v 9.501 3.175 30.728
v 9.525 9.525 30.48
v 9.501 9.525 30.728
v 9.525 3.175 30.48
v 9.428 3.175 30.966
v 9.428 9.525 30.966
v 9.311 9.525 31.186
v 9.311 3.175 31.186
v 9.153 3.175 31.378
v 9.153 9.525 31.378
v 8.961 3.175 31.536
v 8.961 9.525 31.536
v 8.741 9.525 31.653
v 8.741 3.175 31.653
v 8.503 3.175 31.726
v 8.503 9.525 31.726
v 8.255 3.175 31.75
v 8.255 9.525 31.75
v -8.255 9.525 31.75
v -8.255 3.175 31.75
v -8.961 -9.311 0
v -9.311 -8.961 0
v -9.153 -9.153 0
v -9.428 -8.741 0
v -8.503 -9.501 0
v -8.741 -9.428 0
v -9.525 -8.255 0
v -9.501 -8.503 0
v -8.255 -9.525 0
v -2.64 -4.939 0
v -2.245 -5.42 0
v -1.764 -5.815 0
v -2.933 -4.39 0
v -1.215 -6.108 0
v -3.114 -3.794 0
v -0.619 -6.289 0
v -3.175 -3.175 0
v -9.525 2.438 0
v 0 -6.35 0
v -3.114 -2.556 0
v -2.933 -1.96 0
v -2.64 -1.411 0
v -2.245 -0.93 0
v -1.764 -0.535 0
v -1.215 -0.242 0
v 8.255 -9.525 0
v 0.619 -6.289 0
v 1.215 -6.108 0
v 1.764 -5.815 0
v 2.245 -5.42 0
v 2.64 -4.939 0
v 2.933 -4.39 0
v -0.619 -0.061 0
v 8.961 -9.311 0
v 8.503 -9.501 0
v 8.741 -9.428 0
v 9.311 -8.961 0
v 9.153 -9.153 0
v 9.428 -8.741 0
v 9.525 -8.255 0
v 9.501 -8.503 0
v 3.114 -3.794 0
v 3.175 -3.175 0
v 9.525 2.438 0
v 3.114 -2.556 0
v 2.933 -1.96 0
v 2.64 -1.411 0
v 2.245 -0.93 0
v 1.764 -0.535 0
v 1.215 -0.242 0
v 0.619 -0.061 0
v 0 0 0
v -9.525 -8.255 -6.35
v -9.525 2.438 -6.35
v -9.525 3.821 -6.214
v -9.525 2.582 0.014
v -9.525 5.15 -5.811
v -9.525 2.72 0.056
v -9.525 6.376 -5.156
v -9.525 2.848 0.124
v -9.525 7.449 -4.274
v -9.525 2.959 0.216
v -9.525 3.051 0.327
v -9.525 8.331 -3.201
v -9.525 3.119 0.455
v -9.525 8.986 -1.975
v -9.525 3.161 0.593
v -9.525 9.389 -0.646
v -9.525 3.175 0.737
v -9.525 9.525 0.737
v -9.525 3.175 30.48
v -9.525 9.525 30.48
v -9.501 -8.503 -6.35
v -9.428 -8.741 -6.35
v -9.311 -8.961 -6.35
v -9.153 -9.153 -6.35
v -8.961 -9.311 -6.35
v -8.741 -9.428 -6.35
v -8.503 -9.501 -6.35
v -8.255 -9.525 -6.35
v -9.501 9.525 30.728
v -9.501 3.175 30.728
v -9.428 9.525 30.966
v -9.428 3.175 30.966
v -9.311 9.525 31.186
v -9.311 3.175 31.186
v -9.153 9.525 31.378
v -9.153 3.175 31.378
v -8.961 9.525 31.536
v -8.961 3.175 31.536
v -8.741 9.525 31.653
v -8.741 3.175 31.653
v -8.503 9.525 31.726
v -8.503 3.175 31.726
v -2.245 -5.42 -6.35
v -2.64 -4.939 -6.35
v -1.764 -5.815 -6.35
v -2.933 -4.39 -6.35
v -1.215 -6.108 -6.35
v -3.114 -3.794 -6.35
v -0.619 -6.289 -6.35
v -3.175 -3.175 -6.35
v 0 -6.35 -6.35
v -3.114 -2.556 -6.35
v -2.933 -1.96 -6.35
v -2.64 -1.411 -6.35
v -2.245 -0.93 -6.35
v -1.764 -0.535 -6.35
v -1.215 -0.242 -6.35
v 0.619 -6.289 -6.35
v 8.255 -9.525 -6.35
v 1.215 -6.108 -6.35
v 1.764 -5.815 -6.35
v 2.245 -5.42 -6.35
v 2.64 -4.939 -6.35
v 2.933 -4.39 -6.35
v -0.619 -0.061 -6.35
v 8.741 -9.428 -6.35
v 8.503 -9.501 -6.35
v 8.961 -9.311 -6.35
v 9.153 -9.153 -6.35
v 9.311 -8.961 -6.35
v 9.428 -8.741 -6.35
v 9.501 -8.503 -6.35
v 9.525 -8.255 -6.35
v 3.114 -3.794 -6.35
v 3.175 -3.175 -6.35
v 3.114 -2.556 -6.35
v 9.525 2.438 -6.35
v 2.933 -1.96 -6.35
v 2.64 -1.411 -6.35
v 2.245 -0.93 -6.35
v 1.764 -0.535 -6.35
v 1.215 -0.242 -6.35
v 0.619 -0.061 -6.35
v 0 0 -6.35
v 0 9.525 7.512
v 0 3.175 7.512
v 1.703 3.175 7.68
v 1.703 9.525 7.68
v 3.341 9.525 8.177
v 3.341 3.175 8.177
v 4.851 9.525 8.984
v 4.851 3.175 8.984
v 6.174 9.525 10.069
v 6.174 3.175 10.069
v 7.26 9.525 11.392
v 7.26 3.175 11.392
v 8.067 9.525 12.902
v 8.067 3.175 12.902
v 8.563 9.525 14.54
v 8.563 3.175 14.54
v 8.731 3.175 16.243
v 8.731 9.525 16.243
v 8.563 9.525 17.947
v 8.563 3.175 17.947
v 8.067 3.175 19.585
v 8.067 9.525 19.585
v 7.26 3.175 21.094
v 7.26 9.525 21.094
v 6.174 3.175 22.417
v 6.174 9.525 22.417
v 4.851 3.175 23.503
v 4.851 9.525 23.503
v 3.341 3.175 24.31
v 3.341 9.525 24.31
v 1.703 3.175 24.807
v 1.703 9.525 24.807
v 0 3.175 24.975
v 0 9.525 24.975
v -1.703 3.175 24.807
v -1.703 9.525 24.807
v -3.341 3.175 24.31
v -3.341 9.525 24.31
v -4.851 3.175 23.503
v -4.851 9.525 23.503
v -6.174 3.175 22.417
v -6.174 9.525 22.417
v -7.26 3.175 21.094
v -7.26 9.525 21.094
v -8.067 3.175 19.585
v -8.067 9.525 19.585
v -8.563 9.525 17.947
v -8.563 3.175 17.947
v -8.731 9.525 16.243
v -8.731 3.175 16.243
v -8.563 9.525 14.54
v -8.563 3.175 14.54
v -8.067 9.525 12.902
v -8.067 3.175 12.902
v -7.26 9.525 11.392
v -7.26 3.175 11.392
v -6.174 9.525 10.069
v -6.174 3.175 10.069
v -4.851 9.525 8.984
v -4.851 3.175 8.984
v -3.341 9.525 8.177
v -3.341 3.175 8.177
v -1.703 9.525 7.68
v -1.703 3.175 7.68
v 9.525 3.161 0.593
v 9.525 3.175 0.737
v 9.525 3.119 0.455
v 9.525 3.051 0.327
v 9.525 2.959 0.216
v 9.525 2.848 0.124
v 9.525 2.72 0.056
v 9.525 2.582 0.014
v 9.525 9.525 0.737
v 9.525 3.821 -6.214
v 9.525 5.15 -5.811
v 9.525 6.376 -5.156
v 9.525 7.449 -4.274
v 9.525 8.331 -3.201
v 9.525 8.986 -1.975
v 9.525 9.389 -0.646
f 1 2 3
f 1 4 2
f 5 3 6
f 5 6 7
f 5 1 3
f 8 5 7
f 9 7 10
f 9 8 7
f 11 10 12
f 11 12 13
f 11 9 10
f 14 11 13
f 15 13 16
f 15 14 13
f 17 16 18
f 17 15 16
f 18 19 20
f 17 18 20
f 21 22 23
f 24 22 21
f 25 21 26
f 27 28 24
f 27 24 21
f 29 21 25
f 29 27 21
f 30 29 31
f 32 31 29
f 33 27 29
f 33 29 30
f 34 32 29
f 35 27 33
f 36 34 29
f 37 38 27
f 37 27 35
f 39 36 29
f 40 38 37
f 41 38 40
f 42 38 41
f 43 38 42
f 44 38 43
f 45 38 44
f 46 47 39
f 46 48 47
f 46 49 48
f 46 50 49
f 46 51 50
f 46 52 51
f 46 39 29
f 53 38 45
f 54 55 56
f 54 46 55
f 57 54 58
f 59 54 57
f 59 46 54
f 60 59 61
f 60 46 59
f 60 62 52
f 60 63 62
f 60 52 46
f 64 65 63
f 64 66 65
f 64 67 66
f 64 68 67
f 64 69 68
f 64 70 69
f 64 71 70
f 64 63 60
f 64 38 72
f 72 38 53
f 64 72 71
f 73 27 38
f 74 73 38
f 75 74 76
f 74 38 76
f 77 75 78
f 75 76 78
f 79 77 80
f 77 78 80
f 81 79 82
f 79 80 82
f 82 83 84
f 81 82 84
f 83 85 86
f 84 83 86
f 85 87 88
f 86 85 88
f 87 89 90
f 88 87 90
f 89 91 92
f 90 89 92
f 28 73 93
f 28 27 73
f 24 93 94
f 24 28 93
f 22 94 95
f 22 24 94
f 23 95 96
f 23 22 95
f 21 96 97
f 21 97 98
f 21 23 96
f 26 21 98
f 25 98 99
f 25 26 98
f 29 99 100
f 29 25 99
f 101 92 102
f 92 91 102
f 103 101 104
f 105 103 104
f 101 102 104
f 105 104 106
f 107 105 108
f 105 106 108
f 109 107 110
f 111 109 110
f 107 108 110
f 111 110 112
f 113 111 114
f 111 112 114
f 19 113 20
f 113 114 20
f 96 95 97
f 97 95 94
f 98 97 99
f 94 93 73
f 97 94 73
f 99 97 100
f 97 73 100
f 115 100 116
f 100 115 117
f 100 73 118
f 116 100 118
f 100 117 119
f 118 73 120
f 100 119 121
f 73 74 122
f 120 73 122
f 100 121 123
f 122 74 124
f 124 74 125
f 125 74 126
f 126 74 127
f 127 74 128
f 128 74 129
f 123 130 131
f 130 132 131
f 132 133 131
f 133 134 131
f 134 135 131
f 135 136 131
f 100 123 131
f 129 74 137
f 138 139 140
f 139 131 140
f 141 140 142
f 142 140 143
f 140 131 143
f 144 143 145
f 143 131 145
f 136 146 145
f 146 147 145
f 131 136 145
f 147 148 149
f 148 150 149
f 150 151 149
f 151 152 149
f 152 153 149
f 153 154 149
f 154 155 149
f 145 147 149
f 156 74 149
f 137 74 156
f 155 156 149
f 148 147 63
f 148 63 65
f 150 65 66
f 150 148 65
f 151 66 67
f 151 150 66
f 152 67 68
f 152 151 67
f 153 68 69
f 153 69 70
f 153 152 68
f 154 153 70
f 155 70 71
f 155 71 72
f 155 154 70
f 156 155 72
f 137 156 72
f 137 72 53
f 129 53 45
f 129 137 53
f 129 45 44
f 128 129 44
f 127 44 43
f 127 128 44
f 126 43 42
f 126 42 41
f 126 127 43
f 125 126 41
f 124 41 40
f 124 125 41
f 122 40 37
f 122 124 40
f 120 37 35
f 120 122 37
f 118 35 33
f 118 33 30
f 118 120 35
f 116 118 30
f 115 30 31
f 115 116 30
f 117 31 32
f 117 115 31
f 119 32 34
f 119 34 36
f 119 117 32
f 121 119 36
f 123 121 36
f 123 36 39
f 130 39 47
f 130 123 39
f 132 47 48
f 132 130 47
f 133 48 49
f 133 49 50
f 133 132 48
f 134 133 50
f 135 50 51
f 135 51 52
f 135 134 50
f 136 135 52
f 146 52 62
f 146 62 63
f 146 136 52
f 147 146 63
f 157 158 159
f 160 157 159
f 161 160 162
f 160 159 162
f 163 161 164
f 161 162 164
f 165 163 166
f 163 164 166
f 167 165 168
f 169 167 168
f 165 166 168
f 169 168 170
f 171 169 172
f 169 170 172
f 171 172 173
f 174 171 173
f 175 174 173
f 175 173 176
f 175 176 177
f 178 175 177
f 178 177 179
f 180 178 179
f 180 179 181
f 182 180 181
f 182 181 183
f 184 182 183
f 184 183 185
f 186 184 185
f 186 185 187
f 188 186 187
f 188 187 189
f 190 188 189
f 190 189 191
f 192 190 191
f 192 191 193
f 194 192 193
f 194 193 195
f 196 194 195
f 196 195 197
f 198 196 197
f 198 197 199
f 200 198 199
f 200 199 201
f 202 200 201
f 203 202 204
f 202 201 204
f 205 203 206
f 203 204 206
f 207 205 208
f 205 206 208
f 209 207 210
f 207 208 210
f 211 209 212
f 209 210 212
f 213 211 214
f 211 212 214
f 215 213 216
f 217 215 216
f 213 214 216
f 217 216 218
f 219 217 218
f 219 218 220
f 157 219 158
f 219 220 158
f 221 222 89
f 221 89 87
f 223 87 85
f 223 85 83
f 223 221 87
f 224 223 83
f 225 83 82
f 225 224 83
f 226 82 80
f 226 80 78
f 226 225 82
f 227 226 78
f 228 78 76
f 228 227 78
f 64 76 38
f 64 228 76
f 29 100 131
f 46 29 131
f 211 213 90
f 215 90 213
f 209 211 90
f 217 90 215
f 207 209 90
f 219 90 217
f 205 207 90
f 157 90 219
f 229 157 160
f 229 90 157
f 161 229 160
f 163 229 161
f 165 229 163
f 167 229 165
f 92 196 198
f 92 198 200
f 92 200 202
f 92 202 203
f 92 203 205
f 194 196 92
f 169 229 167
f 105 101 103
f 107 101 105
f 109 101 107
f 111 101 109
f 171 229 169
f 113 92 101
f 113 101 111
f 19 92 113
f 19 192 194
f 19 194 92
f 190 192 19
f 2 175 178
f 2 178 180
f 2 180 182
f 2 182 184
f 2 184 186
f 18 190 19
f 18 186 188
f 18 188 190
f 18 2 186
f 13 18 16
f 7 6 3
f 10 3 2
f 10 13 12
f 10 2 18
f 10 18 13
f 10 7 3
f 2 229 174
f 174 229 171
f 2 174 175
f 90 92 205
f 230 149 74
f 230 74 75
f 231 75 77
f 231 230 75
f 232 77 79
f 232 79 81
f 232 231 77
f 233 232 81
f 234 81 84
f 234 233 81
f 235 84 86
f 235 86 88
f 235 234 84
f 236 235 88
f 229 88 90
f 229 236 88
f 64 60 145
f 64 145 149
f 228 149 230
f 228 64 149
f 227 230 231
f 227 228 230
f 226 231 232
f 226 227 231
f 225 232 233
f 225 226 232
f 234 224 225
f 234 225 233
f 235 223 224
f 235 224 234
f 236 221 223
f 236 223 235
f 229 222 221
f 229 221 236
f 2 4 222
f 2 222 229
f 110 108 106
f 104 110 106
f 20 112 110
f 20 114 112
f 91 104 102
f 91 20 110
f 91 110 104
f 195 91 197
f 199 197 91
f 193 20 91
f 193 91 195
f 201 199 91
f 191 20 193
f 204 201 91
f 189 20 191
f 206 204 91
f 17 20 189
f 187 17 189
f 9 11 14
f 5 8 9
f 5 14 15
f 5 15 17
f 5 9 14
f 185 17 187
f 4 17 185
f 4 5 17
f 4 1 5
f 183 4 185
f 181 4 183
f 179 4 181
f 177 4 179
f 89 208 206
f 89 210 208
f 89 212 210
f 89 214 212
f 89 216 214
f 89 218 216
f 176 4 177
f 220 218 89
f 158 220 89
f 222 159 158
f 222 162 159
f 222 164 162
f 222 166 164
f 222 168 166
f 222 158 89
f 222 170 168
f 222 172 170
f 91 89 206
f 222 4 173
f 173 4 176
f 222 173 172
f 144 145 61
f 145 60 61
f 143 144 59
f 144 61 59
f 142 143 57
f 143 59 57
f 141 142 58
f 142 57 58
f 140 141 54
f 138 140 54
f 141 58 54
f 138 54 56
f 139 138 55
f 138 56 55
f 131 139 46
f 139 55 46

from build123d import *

# Parameters (mm, degrees)
BASE_FLANGE1_START           = -6.35
BASE_FLANGE1_OUTLINE_W       = 19.05
BASE_FLANGE1_OUTLINE_H       = 19.05
BASE_FLANGE1_OUTLINE_R       = 3.175
BASE_FLANGE1_DEPTH           = 6.35
EDGE_FLANGE1_STRIP_W         = 26.8732
EDGE_FLANGE1_STRIP_H         = 6.35
EDGE_FLANGE1_STRIP_CUT_DEPTH = 19.05
EDGE_FLANGE1_DEPTH           = 19.05
SKETCH9_R                    = 8.73125
CUT_EXTRUDE1_DEPTH           = 36.497579143
FILLET2_R                    = 1.27


# Read off the part's stored shape, not the designer's step: Base-Flange1
# Sheet-metal steps are written as plain solids
with BuildPart() as part:
    # Base-Flange1 outline → Base-Flange1 (new body)
    with BuildSketch(Plane.XY.offset(BASE_FLANGE1_START)):
        Rectangle(BASE_FLANGE1_OUTLINE_W, BASE_FLANGE1_OUTLINE_H)
        with Locations((0, -3.175)):
            Circle(BASE_FLANGE1_OUTLINE_R, mode=Mode.SUBTRACT)
    extrude(amount=BASE_FLANGE1_DEPTH)

    # Edge-Flange1 strip (across the edge) → Edge-Flange1 strip cut (cut)
    with BuildSketch(Plane(origin=(9.525, 9.525, 0), x_dir=(0, -1, 0), z_dir=(-1, 0, 0))):
        with Locations((-6.35, -3.175)):
            Rectangle(EDGE_FLANGE1_STRIP_W, EDGE_FLANGE1_STRIP_H)
    extrude(amount=EDGE_FLANGE1_STRIP_CUT_DEPTH, mode=Mode.SUBTRACT)

    # Edge-Flange1 section (across the edge) → Edge-Flange1 (add)
    with BuildSketch(Plane(origin=(9.525, 9.525, 0), x_dir=(0, -1, 0), z_dir=(-1, 0, 0))):
        with BuildLine():
            Line((0, 0.7366), (0, 31.75))
            Line((0, 31.75), (6.35, 31.75))
            Line((6.35, 31.75), (6.35, 0.7366))
            ThreePointArc((6.35, 0.7366), (6.565745145, 0.215745145), (7.0866, 0))
            Line((7.0866, 0), (7.0866, -6.35))
            ThreePointArc((7.0866, -6.35), (2.075617084, -4.274382916), (0, 0.7366))
        make_face()
    extrude(amount=EDGE_FLANGE1_DEPTH)

    # Sketch9 → Cut-Extrude1 (cut, through all)
    with BuildSketch(Plane.XZ.offset(-3.175)):
        with Locations(Location((0, 16.2433, 0), (0, 0, 270))):
            Circle(SKETCH9_R)
    extrude(amount=-CUT_EXTRUDE1_DEPTH, mode=Mode.SUBTRACT)

    # Fillet2
    fillet2_edges = [part.edges().sort_by_distance(p)[0] for p in [
        (9.525, 6.35, 31.75),
        (-9.525, 6.35, 31.75),
        (9.525, -9.525, -3.175),
        (-9.525, -9.525, -3.175),
    ]]
    fillet(fillet2_edges, radius=FILLET2_R)


solid = part.part
